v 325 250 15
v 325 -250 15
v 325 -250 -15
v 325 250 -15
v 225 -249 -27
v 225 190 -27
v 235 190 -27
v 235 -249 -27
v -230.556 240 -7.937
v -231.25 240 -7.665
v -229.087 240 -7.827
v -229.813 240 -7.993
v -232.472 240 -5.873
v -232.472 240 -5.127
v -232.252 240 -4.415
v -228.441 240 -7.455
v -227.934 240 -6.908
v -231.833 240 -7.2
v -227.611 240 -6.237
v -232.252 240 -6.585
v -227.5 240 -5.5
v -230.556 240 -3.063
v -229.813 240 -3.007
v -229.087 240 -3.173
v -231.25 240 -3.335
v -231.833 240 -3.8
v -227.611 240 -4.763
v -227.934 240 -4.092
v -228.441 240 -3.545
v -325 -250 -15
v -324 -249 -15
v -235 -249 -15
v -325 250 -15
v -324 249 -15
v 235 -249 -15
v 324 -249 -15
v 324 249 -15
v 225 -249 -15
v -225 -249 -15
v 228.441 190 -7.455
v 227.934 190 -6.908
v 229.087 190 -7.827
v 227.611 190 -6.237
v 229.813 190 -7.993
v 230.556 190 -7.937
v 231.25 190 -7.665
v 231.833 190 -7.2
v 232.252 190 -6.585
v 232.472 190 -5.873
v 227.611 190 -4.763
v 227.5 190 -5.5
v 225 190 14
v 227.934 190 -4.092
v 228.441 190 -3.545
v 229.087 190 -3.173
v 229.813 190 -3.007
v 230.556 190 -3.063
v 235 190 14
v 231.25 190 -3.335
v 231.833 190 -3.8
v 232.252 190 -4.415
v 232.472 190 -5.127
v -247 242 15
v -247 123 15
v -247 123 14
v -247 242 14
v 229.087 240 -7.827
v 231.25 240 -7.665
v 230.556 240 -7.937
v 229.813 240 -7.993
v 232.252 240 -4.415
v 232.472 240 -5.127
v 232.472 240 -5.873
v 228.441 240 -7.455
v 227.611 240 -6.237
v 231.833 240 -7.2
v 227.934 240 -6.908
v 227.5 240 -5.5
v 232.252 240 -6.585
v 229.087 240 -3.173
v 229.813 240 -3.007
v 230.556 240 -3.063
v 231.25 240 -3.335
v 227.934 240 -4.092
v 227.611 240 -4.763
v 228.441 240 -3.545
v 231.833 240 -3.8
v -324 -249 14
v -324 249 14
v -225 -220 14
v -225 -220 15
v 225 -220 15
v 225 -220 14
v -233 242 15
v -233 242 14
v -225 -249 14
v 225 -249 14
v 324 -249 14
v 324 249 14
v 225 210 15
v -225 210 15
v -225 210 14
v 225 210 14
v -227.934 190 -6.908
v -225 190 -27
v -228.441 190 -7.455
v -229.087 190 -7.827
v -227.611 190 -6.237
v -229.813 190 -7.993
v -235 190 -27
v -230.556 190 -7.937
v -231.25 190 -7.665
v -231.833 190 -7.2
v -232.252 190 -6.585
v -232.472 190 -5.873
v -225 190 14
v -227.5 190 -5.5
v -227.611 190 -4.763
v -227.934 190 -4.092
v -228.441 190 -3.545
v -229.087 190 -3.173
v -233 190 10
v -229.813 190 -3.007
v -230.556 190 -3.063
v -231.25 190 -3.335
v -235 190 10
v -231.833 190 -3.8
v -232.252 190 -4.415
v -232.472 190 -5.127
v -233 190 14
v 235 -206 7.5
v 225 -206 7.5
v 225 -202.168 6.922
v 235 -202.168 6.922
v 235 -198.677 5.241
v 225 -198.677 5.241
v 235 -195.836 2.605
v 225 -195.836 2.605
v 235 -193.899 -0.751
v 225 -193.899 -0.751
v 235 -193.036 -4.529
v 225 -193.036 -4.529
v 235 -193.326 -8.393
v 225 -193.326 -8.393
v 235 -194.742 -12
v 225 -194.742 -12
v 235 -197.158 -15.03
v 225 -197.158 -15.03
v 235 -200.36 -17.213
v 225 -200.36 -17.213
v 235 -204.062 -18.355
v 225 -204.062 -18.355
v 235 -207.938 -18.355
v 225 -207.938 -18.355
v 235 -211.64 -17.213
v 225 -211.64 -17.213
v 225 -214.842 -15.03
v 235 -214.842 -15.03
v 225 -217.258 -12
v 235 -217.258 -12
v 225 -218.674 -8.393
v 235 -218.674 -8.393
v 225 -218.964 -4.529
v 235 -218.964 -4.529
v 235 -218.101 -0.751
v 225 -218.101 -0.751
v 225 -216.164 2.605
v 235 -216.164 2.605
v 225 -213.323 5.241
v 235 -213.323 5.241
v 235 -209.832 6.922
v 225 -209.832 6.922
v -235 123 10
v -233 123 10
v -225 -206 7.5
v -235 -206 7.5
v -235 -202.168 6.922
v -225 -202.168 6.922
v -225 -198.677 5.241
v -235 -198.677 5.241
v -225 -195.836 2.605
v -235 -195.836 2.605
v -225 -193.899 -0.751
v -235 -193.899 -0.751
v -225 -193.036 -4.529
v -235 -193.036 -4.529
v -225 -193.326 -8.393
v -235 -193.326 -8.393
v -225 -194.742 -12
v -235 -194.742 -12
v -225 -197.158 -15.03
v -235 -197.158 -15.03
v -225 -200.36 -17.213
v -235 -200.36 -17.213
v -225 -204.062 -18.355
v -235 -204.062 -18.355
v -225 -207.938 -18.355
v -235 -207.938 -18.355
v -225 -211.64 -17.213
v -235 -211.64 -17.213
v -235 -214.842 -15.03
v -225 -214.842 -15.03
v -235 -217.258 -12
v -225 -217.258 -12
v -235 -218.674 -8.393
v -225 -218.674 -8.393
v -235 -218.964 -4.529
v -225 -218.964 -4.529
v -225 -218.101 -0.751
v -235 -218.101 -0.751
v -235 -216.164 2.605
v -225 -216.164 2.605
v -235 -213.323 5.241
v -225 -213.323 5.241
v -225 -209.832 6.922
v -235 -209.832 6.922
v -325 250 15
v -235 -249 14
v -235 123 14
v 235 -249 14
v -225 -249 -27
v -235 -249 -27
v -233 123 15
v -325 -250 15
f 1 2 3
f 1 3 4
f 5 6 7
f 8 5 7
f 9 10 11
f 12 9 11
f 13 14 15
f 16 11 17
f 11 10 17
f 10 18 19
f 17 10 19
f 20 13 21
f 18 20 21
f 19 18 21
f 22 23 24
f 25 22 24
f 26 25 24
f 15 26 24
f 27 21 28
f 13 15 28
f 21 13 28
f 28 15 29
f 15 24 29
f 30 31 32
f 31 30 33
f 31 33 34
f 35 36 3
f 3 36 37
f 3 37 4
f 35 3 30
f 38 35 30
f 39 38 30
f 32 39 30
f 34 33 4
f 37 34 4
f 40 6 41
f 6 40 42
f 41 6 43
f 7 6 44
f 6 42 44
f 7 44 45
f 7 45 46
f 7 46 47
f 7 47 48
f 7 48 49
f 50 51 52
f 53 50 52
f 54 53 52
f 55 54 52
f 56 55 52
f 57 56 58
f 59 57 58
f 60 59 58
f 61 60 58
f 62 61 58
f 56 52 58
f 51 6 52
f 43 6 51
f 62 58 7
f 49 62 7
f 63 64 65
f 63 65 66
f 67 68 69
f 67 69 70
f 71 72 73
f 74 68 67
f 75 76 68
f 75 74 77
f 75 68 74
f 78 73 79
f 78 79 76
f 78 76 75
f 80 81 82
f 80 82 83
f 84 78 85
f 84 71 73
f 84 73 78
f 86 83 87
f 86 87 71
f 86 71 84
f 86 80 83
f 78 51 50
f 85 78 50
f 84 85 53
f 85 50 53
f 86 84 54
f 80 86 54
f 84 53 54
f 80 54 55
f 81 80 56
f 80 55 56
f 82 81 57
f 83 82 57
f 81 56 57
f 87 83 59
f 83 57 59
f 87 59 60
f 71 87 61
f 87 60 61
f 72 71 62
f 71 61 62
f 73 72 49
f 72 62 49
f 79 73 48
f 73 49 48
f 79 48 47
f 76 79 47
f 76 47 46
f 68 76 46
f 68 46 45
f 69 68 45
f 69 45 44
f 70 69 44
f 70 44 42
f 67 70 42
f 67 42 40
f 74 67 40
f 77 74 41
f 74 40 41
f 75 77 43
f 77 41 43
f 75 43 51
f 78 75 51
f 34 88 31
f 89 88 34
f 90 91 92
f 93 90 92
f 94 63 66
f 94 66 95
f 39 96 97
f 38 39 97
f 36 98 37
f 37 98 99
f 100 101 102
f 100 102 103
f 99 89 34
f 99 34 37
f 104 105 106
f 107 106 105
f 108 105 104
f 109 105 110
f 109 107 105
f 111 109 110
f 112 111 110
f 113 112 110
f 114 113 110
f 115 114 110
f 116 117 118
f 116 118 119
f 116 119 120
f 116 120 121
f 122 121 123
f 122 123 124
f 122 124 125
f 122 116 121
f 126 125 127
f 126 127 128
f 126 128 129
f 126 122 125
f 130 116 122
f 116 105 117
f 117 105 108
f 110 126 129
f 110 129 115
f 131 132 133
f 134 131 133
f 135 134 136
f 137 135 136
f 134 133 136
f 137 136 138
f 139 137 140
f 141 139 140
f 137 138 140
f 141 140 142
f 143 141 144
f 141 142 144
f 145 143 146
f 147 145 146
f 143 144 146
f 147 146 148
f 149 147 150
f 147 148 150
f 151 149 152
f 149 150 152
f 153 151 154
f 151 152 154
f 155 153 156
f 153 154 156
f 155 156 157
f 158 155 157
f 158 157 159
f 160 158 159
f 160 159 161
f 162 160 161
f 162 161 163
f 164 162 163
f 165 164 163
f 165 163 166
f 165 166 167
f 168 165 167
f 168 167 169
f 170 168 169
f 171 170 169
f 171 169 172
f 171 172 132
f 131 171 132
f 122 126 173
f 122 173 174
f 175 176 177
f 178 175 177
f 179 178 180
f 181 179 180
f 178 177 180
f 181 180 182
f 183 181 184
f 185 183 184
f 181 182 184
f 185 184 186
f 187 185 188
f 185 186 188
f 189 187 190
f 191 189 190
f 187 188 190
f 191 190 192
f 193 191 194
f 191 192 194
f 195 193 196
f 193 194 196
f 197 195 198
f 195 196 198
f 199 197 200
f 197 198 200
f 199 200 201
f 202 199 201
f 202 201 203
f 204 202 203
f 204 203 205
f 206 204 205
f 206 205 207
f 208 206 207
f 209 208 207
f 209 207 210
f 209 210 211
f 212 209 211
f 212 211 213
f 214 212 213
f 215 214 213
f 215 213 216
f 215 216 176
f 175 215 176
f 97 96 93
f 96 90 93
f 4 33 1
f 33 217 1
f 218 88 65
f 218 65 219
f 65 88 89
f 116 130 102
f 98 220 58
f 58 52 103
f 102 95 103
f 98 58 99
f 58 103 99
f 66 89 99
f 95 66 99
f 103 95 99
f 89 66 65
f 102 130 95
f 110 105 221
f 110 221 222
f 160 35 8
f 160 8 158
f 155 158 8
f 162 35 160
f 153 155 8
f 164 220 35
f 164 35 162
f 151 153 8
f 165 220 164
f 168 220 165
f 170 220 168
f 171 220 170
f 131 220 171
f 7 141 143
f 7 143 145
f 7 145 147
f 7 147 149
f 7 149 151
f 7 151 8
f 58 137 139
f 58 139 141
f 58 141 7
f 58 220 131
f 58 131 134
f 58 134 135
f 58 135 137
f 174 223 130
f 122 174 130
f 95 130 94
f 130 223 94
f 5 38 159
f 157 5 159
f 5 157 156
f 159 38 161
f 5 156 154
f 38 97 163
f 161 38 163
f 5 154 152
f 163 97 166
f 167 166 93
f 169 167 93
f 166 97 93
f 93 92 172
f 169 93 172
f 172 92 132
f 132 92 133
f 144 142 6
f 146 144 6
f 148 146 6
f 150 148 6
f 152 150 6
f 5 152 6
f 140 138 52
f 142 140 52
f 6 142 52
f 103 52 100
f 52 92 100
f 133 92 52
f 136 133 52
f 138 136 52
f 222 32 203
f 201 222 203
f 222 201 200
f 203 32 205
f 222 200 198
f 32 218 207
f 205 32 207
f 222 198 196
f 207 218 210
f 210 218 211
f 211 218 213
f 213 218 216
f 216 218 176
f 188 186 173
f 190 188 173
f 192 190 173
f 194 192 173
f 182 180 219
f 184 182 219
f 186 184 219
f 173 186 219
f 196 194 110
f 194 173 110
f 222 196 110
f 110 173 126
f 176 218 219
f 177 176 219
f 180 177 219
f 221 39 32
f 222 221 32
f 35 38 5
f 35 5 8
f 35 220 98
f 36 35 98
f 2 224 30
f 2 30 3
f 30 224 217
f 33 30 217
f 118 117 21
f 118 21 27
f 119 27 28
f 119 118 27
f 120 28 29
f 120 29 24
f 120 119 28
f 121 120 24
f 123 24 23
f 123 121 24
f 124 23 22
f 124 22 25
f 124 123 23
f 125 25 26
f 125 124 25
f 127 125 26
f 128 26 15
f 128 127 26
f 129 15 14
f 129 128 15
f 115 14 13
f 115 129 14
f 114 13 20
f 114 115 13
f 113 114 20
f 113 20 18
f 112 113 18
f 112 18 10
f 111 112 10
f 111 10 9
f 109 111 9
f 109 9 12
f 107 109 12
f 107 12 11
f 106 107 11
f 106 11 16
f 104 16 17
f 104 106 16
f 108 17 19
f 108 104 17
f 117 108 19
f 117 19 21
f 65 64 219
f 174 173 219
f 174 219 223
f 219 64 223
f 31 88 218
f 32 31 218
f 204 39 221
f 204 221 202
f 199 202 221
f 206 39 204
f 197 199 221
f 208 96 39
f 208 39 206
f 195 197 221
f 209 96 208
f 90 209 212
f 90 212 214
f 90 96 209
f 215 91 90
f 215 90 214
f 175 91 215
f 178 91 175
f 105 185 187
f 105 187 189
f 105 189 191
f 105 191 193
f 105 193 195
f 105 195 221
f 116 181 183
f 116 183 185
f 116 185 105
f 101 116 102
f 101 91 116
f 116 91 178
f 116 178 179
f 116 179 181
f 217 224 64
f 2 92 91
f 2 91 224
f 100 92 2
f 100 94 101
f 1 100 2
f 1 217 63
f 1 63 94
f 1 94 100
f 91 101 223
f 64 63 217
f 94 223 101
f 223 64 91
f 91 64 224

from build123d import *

# Parameters (mm, degrees)
SKETCH1_W           = 650
SKETCH1_H           = 500
SKETCH1_W_2         = 450
SKETCH1_H_2         = 420
BOSS_EXTRUDE1_DEPTH = 15
SHELL1_T            = -1
SKETCH3_W           = 450
SKETCH3_H           = 10
CUT_EXTRUDE1_DEPTH  = 20
SKETCH4_W           = 10
SKETCH4_H           = 439
BOSS_EXTRUDE2_DEPTH = 41
SKETCH5_R           = 13
CUT_EXTRUDE2_DEPTH  = 470
SKETCH6_R           = 2.5
BOSS_EXTRUDE3_DEPTH = 50
SKETCH7_W           = 14
SKETCH7_H           = 119
CUT_EXTRUDE3_DEPTH  = 5


with BuildPart() as part:
    # Sketch1 → Boss-Extrude1 (new, symmetric)
    with BuildSketch(Plane.XY):
        Rectangle(SKETCH1_W, SKETCH1_H)
        Rectangle(SKETCH1_W_2, SKETCH1_H_2, mode=Mode.SUBTRACT)
    extrude(amount=BOSS_EXTRUDE1_DEPTH, both=True)

    # Shell1
    shell1_openings = [part.faces().sort_by_distance(p)[0] for p in [
        (0, -241.799390267, -15),
        (-225, 0, 0),
        (0, -210, 0),
        (225, 0, 0),
        (0, 210, 0),
    ]]
    offset(amount=SHELL1_T, openings=shell1_openings, kind=Kind.INTERSECTION)

    # Sketch3 → Cut-Extrude1 (cut, symmetric)
    with BuildSketch(Plane.XY):
        with Locations((0, -215)):
            Rectangle(SKETCH3_W, SKETCH3_H)
    extrude(amount=CUT_EXTRUDE1_DEPTH, both=True, mode=Mode.SUBTRACT)

    # Sketch4 → Boss-Extrude2 (add)
    with BuildSketch(Plane(origin=(0, 0, 14), x_dir=(-1, 0, 0), z_dir=(0, 0, -1))):
        with Locations((230, -29.5)):
            Rectangle(SKETCH4_W, SKETCH4_H)
    boss_extrude2 = extrude(amount=BOSS_EXTRUDE2_DEPTH)

    # Mirror1: Boss-Extrude2 across plane
    add(boss_extrude2.mirror(Plane(origin=(0, 0, 0), x_dir=(0, 0, 1), z_dir=(1, 0, 0))))

    # Sketch5 → Cut-Extrude2 (cut)
    with BuildSketch(Plane.ZY.offset(235)):
        with Locations((-5.5, -206)):
            Circle(SKETCH5_R)
    extrude(amount=-CUT_EXTRUDE2_DEPTH, mode=Mode.SUBTRACT)

    # Sketch6 → Boss-Extrude3 (add)
    with BuildSketch(Plane(origin=(0, 190, 0), x_dir=(1, 0, 0), z_dir=(0, 1, 0))):
        with Locations(Location((230, 5.5, 0), (0, 0, 180))):
            Circle(SKETCH6_R)
    boss_extrude3 = extrude(amount=BOSS_EXTRUDE3_DEPTH)

    # Mirror2: Boss-Extrude3 across plane
    add(boss_extrude3.mirror(Plane(origin=(0, 0, 0), x_dir=(0, 0, 1), z_dir=(1, 0, 0))))

    # Sketch7 → Cut-Extrude3 (cut)
    with BuildSketch(Plane.XY.offset(15)):
        with Locations((-240, 182.5)):
            Rectangle(SKETCH7_W, SKETCH7_H)
    extrude(amount=-CUT_EXTRUDE3_DEPTH, mode=Mode.SUBTRACT)


solid = part.part
